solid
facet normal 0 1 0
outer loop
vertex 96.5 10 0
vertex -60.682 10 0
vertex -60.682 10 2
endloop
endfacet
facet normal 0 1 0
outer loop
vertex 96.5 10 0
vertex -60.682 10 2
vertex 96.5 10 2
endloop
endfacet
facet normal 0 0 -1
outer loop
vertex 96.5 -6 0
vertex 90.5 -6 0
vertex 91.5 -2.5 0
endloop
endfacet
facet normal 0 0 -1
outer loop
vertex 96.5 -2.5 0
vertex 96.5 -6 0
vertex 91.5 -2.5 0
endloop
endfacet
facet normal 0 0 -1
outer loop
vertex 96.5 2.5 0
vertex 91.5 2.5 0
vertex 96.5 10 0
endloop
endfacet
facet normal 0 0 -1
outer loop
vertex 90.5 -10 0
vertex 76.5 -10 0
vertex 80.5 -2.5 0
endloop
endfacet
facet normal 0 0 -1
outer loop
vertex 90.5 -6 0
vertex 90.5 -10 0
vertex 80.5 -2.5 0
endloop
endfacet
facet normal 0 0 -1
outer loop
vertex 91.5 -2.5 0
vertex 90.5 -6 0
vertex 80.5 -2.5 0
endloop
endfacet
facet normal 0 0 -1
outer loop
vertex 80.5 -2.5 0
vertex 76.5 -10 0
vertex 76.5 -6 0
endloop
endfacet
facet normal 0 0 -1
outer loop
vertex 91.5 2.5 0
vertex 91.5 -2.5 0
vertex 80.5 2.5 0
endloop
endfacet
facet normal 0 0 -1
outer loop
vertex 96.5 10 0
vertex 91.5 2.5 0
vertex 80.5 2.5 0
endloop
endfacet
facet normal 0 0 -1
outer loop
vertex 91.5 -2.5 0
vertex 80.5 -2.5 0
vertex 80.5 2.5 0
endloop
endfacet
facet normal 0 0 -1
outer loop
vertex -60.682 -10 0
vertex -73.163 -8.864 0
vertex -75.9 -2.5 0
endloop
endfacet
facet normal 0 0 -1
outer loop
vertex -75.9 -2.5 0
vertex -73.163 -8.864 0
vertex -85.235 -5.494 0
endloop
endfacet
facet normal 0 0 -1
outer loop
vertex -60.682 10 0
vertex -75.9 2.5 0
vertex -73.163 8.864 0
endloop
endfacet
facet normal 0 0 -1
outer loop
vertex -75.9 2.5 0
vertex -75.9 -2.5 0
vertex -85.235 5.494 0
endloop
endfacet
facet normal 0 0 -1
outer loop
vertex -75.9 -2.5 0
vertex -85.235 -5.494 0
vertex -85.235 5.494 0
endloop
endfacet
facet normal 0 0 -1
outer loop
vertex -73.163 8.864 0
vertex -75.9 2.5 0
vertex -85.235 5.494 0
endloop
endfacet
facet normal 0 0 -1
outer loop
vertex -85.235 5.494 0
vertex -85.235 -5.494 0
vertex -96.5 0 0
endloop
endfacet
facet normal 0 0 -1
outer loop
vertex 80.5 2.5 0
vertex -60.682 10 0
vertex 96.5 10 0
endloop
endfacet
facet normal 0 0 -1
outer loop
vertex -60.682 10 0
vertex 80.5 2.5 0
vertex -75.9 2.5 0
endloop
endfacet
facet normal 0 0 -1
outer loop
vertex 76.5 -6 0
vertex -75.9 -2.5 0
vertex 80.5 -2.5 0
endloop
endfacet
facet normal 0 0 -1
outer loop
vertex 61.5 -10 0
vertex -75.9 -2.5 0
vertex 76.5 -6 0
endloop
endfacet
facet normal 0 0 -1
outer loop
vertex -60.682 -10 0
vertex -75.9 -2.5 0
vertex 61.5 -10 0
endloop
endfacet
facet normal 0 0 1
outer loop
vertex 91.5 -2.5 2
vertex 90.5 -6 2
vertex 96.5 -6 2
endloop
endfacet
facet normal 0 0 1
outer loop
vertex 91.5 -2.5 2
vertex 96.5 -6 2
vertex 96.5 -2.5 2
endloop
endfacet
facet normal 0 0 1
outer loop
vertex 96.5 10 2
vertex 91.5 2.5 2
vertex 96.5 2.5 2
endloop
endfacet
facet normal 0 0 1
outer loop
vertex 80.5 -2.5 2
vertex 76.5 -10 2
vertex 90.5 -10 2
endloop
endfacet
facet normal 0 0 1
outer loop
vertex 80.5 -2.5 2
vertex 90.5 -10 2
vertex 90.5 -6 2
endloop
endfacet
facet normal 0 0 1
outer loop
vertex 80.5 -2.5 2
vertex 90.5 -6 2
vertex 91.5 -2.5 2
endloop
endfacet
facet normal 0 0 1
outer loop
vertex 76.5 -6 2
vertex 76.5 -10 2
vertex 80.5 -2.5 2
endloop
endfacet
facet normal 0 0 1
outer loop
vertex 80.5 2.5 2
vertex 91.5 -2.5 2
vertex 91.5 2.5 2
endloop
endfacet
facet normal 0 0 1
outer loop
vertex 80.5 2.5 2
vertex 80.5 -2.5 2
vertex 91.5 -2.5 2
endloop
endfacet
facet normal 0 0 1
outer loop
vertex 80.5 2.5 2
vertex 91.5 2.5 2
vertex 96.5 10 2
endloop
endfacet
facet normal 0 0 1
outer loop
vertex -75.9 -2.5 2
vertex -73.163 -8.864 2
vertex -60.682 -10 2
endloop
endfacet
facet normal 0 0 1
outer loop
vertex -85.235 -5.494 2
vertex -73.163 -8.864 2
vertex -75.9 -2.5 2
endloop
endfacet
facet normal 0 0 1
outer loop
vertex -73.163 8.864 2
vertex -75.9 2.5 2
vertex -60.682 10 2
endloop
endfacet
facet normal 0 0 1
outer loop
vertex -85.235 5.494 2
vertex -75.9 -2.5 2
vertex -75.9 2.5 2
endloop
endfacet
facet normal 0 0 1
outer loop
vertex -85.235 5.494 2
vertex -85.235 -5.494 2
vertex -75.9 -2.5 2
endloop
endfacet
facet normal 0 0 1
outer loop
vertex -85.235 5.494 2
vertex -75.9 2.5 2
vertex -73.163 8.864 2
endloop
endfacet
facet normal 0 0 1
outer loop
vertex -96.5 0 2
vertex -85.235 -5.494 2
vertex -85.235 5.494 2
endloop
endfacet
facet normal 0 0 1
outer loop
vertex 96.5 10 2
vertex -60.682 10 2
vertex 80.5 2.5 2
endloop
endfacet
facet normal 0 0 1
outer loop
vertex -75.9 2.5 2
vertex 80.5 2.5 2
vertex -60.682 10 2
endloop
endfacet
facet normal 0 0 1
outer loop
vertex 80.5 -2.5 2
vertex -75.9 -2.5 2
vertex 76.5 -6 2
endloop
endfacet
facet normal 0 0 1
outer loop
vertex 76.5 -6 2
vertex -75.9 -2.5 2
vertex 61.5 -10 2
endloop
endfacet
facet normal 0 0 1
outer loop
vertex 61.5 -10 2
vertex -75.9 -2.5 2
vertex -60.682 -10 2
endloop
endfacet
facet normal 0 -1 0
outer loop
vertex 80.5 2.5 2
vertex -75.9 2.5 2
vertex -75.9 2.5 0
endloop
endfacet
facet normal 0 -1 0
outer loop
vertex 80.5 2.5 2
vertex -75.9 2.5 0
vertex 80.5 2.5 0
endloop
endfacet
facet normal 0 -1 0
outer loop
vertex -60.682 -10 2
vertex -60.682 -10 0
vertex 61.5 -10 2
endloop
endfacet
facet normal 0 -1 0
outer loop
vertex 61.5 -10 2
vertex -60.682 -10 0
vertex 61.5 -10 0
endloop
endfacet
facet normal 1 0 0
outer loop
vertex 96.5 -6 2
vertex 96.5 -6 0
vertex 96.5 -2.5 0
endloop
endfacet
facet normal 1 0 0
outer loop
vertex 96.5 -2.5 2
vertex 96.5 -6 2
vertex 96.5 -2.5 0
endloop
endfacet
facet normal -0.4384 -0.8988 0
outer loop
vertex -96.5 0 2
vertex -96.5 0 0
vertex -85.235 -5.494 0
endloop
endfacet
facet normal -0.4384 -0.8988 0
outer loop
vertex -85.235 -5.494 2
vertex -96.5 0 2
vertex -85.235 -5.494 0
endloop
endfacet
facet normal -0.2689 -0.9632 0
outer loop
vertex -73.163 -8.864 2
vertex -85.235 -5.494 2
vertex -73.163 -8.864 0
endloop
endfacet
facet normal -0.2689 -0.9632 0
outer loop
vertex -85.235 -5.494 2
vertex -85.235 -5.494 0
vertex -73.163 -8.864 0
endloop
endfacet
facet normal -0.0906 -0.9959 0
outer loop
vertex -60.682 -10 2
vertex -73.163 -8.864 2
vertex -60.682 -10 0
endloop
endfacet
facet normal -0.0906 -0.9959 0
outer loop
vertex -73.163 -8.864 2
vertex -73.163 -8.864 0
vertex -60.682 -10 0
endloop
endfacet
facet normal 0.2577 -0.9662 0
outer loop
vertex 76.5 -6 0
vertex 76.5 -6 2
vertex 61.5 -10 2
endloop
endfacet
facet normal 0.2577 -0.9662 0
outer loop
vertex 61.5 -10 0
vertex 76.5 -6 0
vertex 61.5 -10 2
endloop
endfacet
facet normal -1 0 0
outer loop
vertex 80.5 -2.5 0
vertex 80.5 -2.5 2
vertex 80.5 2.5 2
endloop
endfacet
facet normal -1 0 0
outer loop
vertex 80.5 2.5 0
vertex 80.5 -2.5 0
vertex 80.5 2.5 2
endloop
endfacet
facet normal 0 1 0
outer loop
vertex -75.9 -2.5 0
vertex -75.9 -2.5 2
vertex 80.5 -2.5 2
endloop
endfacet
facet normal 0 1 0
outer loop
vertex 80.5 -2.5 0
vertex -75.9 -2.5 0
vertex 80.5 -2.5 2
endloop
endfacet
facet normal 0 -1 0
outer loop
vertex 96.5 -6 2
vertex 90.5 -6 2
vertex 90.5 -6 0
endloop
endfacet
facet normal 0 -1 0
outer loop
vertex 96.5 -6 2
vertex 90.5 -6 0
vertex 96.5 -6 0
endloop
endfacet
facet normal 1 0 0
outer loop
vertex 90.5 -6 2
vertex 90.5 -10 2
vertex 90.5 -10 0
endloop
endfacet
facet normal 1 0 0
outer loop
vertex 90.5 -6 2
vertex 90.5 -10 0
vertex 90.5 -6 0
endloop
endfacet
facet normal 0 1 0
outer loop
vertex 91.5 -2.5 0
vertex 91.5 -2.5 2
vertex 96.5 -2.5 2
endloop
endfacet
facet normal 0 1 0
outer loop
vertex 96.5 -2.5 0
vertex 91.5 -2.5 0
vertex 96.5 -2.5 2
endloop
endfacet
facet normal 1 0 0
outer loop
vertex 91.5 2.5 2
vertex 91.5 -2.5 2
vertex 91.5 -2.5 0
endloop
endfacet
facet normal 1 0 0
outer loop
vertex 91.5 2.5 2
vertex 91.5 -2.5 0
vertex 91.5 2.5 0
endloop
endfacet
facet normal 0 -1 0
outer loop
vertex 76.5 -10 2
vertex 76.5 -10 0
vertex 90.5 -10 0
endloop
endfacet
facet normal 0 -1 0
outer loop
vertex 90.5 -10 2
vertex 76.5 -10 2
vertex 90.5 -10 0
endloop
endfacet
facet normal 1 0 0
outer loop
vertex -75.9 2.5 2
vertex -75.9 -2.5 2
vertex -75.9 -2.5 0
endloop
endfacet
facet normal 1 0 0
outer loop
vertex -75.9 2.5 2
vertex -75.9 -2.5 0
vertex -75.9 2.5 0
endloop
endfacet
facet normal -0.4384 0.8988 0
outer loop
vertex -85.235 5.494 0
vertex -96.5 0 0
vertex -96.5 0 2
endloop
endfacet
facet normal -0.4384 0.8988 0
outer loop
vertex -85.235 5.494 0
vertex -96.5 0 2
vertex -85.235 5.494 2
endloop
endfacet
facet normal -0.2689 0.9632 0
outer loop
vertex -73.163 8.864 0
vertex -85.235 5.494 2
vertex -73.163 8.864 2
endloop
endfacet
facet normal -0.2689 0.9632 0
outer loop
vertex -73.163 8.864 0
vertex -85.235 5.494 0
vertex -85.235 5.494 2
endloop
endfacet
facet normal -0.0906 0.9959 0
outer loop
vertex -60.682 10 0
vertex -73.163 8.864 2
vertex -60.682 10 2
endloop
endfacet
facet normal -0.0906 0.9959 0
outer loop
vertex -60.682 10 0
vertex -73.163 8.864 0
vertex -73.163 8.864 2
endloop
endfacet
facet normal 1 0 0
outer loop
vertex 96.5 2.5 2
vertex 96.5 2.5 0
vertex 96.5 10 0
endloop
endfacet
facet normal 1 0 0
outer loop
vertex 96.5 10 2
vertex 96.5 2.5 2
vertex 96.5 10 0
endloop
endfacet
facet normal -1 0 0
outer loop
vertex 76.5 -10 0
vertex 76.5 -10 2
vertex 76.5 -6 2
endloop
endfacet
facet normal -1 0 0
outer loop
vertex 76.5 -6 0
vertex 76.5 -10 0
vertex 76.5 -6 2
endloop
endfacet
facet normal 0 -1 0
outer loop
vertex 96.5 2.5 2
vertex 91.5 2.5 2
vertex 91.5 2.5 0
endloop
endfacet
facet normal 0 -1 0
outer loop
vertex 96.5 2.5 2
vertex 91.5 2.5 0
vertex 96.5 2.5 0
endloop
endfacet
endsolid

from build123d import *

# Parameters (mm, degrees)
F0_W        = 193
F0_H        = 20
F1_DEPTH    = 2
F2_W        = 5
F2_H        = 5
F2_W_2      = 167
F3_DEPTH    = 25
F4_SIZE2    = 14.99999
F4_SIZE     = 9.99999
F5_W        = 6
F5_H        = 4
F6_DEPTH    = 25
F7_T1_DEPTH = 106.0916256943
F8_DEPTH    = 10.6


# Not quite as in the source:
# - a fillet or chamfer that OpenCascade refuses, or shapes differently, is made with other operations: its cross-section is extruded or revolved along the edge and cut away or added
# - a fillet or chamfer is up to 0.001 mm smaller than in the source, because OpenCascade refuses the exact size


with BuildPart() as f1:
    # F0 (on Top) → F1 (new body)
    with BuildSketch(Plane.XY):
        Rectangle(F0_W, F0_H)
    extrude(amount=F1_DEPTH)

    # F2 (on face) → F3 (cut)
    with BuildSketch(Plane.XY.offset(2)):
        with Locations((94, 0)):
            Rectangle(F2_W, F2_H)
        with Locations((-3, 0)):
            Rectangle(F2_W_2, F2_H)
    extrude(amount=-F3_DEPTH, mode=Mode.SUBTRACT)

    # F4 (size 10 and 15 in the source; OpenCascade refuses exactly that, so slightly less here)
    f4_edges = [f1.edges().sort_by_distance(p)[0] for p in [
        (-96.5, 10, 1),
        (-96.5, -10, 1),
    ]]
    f4_side = f1.faces().sort_by_distance((-96.5, 0, 1))[0]
    chamfer(f4_edges, length=F4_SIZE, length2=F4_SIZE2, reference=f4_side)

    # F5 (on face) → F6 (cut)
    with BuildSketch(Plane.XY.offset(2)):
        with Locations((93.5, -8)):
            Rectangle(F5_W, F5_H)
        Polygon((61.5, -10), (76.5, -10), (76.5, -6), align=None)
    extrude(amount=-F6_DEPTH, mode=Mode.SUBTRACT)

    # F7: fillet of radius 69.147644117 on 2 edges, made by hand

    # F7_s2 → F7_t1 (cut)
    with BuildSketch(Plane.XY.offset(-52.0458128472)):
        with BuildLine():
            ThreePointArc((-96.5, -1e-05), (-79.2757127961, -7.4530977113), (-60.6816848611, -10))
            Line((-60.6816848611, -10), (-81.50001, -10))
            Line((-81.50001, -10), (-96.5, -1e-05))
        make_face()
        with BuildLine():
            ThreePointArc((-96.5, 1e-05), (-79.2757127961, 7.4530977113), (-60.6816848611, 10))
            Line((-60.6816848611, 10), (-81.50001, 10))
            Line((-81.50001, 10), (-96.5, 1e-05))
        make_face()
    extrude(amount=F7_T1_DEPTH, mode=Mode.SUBTRACT)

    # F8 (add): a face of the model
    f8_faces = [f1.faces().sort_by_distance(p)[0] for p in [
        (-86.5, 0, 1),
    ]]
    extrude(f8_faces, amount=F8_DEPTH)


solid = f1.part
